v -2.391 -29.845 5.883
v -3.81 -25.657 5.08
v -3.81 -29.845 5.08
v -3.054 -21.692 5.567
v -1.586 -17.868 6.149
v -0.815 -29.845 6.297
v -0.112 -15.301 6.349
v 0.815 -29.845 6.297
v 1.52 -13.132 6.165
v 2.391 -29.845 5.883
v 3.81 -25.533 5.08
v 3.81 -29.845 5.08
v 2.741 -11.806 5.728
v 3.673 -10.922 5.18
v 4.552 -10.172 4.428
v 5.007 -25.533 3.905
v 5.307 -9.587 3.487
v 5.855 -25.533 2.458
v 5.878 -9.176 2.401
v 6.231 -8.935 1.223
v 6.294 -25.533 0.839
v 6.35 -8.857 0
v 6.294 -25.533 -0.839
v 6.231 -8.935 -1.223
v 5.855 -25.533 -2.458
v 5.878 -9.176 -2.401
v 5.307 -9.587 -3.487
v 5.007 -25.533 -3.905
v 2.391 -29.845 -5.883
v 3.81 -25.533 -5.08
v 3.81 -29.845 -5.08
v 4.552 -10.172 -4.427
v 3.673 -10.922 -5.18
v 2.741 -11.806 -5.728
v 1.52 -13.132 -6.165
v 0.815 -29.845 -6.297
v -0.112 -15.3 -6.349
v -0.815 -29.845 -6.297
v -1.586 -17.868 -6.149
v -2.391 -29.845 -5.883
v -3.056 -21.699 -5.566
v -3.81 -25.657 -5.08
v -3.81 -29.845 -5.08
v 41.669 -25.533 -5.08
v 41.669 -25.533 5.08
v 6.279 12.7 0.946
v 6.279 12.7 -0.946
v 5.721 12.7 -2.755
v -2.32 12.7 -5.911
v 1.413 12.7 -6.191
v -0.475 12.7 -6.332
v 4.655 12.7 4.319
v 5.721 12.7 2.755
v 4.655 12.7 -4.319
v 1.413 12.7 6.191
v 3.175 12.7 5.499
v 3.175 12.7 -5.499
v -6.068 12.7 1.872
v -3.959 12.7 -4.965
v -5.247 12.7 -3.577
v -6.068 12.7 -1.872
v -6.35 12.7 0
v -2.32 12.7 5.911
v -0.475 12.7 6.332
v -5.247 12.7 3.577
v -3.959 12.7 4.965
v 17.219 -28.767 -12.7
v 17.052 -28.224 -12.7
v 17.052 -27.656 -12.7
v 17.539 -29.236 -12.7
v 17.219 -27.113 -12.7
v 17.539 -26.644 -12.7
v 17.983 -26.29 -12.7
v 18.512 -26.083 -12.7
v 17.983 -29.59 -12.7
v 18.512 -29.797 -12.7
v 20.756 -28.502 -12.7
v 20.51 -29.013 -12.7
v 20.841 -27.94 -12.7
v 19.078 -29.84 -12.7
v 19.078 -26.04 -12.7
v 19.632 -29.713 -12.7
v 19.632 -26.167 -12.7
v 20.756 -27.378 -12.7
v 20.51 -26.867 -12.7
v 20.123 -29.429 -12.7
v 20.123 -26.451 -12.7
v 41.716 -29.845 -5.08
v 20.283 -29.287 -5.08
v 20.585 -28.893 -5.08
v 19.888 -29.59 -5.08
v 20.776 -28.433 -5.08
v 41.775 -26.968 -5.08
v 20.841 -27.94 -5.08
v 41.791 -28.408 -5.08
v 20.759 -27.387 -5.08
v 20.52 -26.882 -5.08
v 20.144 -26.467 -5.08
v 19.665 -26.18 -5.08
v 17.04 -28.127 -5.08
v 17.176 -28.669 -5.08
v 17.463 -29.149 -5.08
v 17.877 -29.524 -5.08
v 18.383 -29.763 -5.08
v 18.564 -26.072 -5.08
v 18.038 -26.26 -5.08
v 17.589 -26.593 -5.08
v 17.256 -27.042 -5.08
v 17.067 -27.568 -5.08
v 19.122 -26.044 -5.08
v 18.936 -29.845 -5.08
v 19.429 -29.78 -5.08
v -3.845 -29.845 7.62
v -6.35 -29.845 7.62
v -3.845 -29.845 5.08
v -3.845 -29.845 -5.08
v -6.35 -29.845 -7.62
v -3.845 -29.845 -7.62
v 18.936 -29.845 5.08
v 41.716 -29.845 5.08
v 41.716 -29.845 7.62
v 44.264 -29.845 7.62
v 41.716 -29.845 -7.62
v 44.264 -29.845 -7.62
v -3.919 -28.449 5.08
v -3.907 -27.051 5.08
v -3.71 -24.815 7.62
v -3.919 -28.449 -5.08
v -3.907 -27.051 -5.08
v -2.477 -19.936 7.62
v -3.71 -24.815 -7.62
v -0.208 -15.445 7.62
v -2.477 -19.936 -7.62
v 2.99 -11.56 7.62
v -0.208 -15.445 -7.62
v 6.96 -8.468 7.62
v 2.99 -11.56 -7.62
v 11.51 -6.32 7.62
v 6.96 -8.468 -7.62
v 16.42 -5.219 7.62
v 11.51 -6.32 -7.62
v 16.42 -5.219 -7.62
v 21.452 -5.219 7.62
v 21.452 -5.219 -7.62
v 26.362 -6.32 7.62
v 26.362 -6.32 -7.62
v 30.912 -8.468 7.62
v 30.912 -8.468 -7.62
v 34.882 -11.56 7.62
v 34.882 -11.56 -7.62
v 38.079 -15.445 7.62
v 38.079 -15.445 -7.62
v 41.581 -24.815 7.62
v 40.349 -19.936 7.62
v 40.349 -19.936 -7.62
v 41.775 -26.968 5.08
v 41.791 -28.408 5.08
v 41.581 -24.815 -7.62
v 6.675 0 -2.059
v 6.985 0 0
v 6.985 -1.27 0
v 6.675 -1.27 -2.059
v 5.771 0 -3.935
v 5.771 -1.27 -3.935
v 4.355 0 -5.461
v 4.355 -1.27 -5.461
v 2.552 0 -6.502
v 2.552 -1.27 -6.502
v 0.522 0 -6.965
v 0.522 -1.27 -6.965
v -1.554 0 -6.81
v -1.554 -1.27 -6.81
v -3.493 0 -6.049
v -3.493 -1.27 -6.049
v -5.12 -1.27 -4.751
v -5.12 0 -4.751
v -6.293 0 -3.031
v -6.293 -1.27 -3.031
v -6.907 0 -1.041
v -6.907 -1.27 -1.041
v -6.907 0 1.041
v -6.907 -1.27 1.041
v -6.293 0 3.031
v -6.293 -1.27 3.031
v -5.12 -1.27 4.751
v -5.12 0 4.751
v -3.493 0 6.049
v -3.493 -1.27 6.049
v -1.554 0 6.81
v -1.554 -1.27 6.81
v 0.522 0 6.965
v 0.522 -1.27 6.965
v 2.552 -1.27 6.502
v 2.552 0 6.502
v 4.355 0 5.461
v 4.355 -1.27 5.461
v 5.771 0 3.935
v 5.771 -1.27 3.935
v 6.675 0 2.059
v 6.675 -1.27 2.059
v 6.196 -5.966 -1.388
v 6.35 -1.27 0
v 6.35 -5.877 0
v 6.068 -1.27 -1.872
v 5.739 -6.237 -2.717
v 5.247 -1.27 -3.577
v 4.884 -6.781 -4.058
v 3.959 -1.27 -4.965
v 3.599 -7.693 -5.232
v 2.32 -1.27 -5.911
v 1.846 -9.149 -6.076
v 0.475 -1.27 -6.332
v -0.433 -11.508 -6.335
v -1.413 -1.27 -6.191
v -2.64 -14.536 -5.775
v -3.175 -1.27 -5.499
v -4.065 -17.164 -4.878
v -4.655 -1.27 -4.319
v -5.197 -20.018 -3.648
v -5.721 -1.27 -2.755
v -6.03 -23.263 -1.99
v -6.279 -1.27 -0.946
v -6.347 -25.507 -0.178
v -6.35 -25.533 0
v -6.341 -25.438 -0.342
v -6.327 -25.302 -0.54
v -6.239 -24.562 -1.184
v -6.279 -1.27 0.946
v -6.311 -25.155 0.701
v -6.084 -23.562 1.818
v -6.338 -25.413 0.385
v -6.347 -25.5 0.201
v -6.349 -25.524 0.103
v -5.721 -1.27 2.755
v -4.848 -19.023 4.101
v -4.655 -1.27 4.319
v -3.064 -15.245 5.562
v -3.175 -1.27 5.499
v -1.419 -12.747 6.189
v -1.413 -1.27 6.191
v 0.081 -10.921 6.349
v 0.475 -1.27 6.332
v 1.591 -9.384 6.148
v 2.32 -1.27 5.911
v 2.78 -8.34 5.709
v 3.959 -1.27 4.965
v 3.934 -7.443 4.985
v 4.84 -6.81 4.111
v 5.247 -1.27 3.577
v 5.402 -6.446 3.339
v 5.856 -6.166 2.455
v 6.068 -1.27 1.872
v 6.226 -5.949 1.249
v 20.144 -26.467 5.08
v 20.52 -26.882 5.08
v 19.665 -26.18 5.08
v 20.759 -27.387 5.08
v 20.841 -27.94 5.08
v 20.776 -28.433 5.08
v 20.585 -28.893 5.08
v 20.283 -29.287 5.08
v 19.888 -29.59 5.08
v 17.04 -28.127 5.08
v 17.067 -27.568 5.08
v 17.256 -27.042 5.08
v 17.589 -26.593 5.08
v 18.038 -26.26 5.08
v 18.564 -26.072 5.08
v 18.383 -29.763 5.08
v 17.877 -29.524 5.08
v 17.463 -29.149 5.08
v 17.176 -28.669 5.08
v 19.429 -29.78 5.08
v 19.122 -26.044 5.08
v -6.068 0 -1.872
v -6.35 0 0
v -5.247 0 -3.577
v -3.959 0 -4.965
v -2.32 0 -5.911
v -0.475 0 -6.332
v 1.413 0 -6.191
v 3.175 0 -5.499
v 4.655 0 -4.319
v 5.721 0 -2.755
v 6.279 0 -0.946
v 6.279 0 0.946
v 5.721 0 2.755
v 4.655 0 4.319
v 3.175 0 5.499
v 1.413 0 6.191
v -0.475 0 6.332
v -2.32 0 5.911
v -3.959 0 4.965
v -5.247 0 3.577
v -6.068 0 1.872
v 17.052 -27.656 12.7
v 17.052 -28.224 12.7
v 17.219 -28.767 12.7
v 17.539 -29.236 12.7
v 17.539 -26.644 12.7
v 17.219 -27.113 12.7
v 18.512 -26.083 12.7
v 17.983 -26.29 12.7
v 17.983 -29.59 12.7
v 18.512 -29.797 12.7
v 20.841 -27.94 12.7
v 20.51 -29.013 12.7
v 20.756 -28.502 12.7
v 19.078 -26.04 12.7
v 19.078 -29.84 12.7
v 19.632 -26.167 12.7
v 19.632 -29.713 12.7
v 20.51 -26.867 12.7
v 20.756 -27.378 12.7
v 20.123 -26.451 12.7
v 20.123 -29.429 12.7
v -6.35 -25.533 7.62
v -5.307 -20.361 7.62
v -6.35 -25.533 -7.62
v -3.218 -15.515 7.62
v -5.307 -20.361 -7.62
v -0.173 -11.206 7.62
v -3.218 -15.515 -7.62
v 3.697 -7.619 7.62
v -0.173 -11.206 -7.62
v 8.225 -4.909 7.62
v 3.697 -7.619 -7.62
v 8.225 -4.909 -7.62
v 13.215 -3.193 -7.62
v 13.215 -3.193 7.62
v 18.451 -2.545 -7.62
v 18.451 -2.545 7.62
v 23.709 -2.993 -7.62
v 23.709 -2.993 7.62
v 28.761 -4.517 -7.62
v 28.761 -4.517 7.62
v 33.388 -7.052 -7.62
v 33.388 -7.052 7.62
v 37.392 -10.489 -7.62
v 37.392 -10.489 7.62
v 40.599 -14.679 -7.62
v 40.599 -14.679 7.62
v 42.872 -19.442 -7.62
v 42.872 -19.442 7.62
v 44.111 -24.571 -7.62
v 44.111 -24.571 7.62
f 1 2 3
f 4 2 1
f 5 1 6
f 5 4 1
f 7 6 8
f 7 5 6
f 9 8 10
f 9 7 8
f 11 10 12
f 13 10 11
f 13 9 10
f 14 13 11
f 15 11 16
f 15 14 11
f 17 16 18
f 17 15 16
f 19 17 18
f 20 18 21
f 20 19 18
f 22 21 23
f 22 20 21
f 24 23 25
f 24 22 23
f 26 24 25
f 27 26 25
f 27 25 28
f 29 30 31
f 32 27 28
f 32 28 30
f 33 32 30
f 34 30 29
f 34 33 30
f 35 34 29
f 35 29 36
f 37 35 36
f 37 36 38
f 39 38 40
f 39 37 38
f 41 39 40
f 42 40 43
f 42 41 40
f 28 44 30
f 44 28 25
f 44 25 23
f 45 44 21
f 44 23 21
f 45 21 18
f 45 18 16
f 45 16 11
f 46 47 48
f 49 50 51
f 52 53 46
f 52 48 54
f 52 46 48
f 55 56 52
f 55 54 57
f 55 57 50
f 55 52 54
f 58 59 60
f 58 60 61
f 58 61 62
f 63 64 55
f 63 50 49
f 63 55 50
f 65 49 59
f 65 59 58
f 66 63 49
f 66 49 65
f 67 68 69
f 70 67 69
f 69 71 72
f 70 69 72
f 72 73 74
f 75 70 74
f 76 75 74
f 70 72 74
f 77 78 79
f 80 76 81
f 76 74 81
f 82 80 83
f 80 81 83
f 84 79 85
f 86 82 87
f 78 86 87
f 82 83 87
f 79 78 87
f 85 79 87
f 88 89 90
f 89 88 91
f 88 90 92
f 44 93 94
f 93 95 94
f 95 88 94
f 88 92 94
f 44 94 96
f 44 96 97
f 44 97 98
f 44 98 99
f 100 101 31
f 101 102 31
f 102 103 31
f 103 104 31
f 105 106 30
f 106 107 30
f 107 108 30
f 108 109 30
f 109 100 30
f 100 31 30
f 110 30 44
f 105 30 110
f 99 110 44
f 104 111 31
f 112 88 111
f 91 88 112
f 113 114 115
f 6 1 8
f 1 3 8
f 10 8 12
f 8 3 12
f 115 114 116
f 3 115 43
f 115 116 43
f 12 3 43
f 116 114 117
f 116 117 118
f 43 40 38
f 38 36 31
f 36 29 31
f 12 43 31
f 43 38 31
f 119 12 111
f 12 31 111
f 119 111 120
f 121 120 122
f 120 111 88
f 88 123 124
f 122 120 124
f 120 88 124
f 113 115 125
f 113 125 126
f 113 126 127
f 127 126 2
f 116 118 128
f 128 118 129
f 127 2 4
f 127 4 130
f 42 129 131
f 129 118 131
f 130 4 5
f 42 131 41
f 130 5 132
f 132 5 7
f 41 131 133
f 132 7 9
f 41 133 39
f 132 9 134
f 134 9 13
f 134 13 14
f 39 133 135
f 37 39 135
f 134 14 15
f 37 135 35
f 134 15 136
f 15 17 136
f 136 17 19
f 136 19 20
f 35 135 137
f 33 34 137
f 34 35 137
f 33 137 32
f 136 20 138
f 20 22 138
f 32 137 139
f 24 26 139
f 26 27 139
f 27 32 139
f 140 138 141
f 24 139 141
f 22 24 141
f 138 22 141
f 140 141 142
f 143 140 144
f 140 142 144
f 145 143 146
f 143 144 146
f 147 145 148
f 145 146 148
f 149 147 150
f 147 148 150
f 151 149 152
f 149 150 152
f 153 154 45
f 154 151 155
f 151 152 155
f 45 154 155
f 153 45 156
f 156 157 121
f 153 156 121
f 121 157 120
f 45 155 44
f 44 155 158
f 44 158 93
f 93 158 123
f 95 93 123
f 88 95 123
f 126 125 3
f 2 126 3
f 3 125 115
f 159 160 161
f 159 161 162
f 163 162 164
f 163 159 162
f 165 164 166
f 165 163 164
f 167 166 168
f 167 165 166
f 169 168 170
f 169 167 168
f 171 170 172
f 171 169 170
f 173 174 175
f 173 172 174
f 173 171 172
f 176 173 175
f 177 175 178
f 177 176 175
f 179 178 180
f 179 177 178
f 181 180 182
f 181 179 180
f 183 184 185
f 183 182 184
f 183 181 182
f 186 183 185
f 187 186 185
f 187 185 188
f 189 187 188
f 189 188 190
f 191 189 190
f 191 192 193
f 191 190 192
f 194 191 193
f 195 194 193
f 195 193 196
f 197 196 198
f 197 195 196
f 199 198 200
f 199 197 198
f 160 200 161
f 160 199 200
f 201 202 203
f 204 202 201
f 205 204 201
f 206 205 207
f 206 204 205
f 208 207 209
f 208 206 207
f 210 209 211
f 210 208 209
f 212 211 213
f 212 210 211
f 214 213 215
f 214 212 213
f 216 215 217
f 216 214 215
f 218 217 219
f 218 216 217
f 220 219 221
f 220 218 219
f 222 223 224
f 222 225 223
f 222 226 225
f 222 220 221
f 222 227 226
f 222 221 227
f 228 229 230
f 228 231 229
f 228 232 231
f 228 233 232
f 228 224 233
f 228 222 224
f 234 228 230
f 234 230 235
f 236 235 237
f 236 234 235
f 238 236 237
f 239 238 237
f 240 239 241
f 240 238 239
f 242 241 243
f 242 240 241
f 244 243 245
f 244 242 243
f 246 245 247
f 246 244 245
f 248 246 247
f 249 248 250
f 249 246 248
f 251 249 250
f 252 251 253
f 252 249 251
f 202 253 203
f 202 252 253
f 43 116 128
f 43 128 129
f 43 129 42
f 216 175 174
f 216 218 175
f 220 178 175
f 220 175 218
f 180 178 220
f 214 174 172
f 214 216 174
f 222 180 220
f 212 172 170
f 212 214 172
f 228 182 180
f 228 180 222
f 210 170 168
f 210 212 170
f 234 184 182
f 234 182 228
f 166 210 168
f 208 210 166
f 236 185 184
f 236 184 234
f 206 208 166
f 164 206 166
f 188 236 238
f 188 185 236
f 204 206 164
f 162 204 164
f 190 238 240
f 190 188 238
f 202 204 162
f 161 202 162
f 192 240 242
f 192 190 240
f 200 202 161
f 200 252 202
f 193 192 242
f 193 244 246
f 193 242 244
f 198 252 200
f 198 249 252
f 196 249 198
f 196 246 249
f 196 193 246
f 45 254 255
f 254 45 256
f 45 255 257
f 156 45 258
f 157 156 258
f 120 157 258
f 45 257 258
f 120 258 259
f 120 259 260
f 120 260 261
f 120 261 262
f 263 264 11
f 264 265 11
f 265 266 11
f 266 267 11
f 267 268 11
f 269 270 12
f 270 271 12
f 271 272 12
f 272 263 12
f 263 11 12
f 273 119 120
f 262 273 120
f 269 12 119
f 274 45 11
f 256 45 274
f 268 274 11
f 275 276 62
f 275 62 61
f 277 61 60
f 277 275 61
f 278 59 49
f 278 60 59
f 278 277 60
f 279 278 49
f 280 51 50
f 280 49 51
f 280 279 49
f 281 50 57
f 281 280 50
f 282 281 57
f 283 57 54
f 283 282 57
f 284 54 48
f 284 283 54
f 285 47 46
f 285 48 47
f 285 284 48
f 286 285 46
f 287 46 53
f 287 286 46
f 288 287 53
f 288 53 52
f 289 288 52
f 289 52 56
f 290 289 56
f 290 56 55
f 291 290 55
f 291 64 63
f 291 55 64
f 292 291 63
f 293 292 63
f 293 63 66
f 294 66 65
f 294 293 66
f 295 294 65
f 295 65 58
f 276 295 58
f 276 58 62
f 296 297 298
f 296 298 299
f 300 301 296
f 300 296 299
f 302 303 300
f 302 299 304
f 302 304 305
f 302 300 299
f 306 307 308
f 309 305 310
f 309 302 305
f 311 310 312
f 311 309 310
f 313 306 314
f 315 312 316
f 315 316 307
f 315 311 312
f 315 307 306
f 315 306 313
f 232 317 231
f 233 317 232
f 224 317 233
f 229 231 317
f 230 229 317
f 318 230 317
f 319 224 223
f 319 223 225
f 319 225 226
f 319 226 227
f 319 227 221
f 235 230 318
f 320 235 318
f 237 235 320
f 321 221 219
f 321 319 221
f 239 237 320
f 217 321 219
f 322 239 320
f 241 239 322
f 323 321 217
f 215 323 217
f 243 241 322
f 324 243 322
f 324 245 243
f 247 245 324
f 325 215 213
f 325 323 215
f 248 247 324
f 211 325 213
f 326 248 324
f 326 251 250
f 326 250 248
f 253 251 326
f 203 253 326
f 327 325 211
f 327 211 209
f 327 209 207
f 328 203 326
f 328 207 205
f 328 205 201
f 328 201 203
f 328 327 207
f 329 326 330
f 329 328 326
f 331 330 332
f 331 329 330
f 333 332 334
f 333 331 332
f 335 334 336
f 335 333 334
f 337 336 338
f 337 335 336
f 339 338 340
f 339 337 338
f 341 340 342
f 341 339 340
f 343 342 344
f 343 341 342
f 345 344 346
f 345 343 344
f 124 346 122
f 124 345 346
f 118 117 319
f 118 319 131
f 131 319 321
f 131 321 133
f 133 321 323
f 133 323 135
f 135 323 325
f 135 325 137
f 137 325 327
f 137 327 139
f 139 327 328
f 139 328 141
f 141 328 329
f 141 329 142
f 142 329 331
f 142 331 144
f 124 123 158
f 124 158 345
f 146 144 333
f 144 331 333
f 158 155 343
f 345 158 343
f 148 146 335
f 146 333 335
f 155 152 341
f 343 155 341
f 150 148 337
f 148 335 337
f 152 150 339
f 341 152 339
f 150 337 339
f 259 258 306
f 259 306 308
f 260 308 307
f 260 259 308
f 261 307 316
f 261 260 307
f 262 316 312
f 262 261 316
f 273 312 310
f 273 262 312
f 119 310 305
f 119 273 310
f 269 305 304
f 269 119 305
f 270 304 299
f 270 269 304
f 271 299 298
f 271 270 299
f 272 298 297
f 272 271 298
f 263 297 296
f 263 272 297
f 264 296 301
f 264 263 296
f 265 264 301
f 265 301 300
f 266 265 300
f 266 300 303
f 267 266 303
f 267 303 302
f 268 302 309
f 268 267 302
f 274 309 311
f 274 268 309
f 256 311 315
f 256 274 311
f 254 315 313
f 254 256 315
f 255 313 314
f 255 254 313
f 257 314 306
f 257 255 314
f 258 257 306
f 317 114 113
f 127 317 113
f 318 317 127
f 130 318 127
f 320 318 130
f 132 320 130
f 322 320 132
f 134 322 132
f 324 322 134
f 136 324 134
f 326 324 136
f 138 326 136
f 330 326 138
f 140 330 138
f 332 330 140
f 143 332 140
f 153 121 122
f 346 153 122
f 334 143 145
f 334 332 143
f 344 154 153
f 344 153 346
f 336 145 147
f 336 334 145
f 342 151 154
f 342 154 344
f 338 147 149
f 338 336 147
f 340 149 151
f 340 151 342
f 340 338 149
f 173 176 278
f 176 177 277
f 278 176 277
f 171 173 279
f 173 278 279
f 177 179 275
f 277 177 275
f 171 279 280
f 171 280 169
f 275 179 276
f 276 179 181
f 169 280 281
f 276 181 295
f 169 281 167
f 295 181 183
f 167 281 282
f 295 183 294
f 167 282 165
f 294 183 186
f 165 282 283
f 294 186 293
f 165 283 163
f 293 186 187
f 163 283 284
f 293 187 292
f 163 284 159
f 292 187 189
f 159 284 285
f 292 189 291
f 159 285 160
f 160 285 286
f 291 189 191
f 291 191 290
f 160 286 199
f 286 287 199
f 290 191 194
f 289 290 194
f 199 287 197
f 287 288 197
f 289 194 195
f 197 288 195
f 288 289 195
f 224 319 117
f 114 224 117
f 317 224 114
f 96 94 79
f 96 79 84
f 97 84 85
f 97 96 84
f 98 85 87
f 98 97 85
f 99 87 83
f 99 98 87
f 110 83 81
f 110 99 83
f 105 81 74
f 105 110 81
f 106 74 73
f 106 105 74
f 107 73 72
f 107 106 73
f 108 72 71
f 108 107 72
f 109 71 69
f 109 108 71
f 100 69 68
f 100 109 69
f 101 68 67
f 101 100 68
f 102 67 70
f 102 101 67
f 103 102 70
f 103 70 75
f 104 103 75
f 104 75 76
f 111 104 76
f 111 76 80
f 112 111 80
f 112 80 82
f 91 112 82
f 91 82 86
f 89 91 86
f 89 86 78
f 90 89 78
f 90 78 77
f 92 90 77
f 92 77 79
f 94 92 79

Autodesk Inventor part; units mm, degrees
ref_plane "YZ Plane" through (0, 0, 0) normal (1, 0, 0) x (0, 1, 0)
ref_plane "XZ Plane" through (0, 0, 0) normal (0, 1, 0) x (-1, 0, 0)
ref_plane "XY Plane" through (0, 0, 0) normal (0, 0, 1) x (1, 0, 0)
sketch "Sketch1" plane through (0, 0, 0) normal (0, 1, 0) x (-1, 0, 0)
  circle A0 centre (0, 0) radius 6.35
  dimension "d0" = 12.7
extrude "Extrusion1" add sketch "Sketch1" along normal blind 12.7
sketch "Sketch2" plane through (0, 0, 0) normal (0, -1, 0) x (1, 0, 0)
  circle A0 centre (0, 0) radius 6.985
  dimension "d3" = 13.97
extrude "Extrusion2" add sketch "Sketch2" along normal blind 1.27
sketch "Sketch3" plane through (0, -1.27, 0) normal (0, -1, 0) x (1, 0, 0)
  circle A0 centre (0, 0) radius 6.35
  dimension "d6" = 12.7
extrude "Extrusion3" add sketch "Sketch3" along normal blind 28.575
sketch "Sketch4" plane through (0, 0, 0) normal (0, 0, 1) x (1, 0, 0)
  line L0 (-6.35, -29.845) -> (6.35, -29.845) projected
  line L1 (-6.35, -29.845) -> (-6.35, -1.27)
  line L2 (-6.985, -1.27) -> (6.985, -1.27) projected
  line L3 (-6.35, -1.27) -> (-6.35, -29.845) projected
  circle A0 centre (18.9357, -27.94) radius 25.4
  circle A1 centre (18.9357, -27.94) radius 22.86
  line L4 (-6.3928, -29.845) -> (44.2642, -29.845)
  point P0 (0, 0)
  point P1 (0, -1.27)
  point P2 (41.7162, -29.845)
  point P3 (-3.8448, -29.845)
  point P4 (-6.35, -25.5331)
  dimension "d11" = 45.72
  dimension "d12" = 26.67
  dimension "d13" = 50.8
  dimension "d14" = 25.2857
extrude "Extrusion4" add sketch "Sketch4" along normal mid plane 15.24 contours L1 A0 L4 A1 L0
sketch "Sketch5" plane through (-6.35, -29.845, 7.62) normal (-1, 0, 0) x (0, 0, 1)
  line L0 (-2.54, 4.318) -> (-2.54, 0)
  line L1 (-2.54, 0) -> (-12.7, 0)
  line L2 (-12.7, 0) -> (-12.7, 4.318)
  line L3 (0, 4.3119) -> (0, 0) projected
  line L4 (-15.24, 0) -> (-15.24, 4.3119) projected
  line L5 (-7.62, 4.3119) -> (0, 4.3119) projected
  line L6 (-12.7, 4.3119) -> (-2.54, 4.3119)
  point P0 (-7.62, 29.845)
  point P1 (-2.5663, 0)
  point P2 (-3.81, 4.3119)
  point P3 (-2.54, 4.3119)
  dimension "d17" = 2.54
  dimension "d18" = 2.54
  dimension "d21" = 4.3119
  dimension "d22" = 0.0061
  dimension "d23" = 0.0061
extrude "Extrusion5" add sketch "Sketch5" against normal blind 50.165
sketch "Sketch6" plane through (0, 0, 0) normal (0, 0, 1) x (1, 0, 0)
  arc A0 (41.7162, -29.845) -> (-3.8448, -29.845) centre (18.9357, -27.94) ccw projected
  circle A1 centre (18.9357, -27.94) radius 1.905
  point P0 (0, 0)
  point P1 (4.5348, -10.1863)
  point P2 (0, -15.133)
  dimension "d26" = 3.81
extrude "Extrusion6" add sketch "Sketch6" along normal mid plane 25.4
properties part number "Wheel sheild (H)"
